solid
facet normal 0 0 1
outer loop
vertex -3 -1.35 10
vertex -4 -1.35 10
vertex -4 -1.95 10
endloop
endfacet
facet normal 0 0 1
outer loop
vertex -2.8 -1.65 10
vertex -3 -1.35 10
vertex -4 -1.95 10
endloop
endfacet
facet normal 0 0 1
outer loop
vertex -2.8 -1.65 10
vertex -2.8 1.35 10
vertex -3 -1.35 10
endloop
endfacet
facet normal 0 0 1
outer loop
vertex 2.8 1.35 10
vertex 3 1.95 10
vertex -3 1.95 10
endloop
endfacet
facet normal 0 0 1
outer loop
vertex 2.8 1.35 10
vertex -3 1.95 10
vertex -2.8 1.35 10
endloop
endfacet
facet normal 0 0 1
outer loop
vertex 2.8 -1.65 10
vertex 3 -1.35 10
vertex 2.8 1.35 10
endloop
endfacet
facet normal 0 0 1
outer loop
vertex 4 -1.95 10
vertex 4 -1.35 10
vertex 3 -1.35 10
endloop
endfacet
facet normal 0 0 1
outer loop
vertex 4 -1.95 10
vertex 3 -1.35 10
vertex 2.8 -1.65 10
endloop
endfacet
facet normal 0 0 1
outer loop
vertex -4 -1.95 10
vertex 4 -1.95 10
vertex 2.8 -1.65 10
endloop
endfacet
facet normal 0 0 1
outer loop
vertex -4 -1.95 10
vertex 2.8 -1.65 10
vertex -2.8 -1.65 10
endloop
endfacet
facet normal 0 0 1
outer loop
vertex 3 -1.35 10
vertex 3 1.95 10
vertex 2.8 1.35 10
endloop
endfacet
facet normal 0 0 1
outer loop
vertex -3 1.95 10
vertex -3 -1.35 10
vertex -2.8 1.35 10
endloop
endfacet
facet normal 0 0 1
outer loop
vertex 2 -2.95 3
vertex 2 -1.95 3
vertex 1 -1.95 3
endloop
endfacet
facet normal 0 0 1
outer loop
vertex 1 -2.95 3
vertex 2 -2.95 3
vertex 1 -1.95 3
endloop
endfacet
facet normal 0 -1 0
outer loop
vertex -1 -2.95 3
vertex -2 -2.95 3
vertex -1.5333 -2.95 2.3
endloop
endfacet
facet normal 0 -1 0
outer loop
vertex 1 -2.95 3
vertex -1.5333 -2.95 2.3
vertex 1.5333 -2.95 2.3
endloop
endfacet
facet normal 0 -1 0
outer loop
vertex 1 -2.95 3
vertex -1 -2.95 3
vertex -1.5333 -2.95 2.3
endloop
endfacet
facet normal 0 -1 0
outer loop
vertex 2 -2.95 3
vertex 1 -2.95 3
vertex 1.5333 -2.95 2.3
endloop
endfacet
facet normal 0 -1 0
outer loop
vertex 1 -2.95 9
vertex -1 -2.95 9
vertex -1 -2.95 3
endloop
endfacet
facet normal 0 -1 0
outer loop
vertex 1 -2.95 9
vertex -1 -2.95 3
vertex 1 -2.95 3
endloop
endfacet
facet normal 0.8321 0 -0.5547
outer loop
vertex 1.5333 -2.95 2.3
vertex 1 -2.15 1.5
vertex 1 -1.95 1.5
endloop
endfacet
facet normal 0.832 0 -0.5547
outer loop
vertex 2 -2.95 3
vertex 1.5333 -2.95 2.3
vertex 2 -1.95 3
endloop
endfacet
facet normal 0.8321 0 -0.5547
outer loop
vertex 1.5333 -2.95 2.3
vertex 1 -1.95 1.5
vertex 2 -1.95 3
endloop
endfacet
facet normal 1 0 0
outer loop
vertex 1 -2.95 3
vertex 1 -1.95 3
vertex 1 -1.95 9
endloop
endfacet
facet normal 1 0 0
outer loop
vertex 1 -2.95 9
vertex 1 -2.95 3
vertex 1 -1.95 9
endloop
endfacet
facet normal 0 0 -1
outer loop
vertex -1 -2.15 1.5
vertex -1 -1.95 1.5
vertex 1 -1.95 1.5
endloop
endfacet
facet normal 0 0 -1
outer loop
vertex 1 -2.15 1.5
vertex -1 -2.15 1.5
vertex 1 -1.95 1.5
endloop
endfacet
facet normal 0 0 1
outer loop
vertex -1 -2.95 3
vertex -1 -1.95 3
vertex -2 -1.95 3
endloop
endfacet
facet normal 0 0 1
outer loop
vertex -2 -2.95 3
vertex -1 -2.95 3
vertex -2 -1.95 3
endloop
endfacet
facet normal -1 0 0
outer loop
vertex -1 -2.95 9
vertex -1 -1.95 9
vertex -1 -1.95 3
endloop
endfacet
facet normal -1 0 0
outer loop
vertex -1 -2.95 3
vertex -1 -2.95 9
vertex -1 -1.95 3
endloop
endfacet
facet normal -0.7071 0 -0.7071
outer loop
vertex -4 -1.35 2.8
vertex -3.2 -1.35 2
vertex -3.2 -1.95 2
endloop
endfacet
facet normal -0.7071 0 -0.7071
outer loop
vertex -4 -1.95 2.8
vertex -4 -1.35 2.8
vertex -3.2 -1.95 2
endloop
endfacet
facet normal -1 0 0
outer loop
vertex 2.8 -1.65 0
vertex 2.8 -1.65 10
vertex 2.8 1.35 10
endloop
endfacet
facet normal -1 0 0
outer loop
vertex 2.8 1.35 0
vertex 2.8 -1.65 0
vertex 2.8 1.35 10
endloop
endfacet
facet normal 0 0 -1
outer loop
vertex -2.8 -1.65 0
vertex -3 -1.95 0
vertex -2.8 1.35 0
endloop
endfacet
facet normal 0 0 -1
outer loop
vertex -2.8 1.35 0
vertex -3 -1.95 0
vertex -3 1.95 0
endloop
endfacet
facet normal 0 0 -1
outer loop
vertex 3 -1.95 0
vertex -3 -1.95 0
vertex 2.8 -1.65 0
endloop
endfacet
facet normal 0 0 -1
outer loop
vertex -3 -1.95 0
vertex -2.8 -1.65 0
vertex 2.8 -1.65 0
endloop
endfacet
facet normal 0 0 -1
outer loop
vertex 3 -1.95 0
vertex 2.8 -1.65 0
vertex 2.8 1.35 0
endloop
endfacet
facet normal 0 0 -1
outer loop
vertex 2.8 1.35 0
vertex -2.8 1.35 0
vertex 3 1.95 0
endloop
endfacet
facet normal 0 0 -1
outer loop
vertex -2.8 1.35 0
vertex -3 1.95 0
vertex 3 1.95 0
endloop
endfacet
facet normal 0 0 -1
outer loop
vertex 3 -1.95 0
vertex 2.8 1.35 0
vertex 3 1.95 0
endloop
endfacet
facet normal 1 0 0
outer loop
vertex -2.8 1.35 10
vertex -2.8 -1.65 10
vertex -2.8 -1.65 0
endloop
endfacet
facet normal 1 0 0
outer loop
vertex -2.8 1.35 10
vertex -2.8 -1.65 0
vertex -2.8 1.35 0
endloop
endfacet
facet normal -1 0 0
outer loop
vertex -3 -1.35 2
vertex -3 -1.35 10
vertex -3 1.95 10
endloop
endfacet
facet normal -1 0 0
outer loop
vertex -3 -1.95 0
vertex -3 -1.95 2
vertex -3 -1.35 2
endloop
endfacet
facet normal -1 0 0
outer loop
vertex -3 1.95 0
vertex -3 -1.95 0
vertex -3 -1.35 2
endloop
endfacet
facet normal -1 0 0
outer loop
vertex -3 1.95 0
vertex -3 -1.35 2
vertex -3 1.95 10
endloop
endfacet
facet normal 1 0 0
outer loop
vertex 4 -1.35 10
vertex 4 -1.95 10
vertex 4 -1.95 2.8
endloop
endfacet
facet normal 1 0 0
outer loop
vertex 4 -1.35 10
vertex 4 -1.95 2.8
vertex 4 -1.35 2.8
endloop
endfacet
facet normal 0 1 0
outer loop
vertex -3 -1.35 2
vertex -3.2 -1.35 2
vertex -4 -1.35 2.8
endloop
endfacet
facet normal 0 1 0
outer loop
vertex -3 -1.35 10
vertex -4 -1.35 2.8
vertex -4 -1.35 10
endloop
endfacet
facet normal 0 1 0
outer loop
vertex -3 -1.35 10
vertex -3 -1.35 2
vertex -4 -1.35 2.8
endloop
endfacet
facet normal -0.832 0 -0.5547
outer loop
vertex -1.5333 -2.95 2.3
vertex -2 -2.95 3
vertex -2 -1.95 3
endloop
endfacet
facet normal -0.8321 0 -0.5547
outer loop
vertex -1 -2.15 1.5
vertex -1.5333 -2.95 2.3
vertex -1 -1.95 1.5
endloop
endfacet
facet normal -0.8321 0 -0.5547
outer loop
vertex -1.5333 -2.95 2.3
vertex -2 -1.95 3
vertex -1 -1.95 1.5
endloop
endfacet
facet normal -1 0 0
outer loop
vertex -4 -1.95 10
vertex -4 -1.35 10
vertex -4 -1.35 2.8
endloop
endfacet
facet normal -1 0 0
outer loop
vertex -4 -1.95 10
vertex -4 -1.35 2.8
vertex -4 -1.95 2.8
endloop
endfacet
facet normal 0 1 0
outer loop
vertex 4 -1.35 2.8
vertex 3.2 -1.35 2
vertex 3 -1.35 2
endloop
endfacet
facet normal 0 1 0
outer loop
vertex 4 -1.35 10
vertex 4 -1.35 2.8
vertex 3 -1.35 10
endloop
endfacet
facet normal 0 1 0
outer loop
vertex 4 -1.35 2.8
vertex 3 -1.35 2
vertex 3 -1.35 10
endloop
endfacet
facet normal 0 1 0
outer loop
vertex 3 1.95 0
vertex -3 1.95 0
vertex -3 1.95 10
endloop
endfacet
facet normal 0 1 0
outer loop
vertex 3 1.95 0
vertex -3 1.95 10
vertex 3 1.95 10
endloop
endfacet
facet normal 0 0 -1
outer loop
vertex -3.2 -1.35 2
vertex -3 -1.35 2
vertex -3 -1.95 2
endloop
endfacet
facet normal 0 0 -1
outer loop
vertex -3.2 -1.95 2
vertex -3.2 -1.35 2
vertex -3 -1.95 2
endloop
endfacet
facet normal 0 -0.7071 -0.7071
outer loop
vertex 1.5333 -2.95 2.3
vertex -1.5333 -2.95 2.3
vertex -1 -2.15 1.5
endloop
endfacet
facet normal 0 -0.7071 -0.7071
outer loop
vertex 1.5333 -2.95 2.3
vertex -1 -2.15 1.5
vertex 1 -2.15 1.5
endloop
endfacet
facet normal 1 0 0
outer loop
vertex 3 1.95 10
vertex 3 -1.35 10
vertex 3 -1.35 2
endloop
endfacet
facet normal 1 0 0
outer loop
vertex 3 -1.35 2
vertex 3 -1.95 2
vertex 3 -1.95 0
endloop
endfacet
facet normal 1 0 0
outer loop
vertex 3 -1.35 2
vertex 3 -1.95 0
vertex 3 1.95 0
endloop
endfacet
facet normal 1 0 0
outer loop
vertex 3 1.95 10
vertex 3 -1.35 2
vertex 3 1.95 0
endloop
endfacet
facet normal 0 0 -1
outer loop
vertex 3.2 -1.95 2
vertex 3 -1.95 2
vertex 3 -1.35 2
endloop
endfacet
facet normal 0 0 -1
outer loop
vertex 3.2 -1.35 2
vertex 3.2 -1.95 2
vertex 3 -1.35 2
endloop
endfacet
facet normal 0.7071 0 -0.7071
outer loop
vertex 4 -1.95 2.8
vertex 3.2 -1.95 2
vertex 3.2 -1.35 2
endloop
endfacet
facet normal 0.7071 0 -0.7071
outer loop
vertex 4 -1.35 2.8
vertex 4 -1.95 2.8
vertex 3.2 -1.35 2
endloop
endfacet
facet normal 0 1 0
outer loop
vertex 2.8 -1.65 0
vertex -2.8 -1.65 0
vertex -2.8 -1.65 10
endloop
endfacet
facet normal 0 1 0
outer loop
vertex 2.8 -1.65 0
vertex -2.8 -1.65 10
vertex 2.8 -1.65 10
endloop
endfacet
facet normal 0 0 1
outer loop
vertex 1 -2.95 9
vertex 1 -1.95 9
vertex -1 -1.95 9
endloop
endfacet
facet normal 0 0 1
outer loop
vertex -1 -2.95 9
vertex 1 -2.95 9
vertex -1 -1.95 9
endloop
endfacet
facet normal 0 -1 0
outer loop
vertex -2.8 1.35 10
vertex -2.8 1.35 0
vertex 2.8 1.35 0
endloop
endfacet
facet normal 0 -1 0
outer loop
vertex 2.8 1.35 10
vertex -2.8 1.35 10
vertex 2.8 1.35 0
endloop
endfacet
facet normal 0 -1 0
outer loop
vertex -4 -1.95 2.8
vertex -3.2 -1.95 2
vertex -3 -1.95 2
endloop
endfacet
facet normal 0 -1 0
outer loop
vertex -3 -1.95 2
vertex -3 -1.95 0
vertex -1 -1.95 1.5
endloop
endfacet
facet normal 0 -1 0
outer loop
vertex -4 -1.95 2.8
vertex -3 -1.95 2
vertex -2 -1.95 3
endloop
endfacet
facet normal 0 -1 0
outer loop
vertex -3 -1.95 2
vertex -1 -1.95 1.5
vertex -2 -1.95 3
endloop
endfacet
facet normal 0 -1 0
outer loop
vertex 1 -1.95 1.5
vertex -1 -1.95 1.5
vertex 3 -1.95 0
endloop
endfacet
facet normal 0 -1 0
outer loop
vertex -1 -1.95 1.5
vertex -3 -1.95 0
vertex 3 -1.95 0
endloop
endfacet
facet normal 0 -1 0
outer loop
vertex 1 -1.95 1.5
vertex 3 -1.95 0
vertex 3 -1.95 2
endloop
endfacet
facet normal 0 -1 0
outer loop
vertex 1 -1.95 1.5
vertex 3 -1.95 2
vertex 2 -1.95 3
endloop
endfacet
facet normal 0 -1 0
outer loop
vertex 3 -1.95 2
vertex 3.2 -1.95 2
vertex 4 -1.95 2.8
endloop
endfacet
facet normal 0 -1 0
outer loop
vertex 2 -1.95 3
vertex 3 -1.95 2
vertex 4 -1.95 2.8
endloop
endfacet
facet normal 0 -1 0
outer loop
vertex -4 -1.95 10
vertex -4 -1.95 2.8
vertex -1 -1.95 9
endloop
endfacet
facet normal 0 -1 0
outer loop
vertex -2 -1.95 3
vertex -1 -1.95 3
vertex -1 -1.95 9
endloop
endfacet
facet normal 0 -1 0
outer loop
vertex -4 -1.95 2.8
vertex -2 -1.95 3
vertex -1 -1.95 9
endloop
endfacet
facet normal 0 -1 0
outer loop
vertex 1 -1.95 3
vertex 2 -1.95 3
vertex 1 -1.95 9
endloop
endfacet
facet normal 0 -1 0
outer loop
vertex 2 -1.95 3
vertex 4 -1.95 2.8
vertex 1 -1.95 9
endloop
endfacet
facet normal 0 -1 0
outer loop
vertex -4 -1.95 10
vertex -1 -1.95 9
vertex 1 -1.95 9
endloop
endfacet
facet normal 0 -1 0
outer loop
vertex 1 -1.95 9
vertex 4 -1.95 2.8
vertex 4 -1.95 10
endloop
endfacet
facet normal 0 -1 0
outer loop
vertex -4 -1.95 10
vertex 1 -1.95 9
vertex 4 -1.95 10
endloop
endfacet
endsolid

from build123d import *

# Parameters (mm, degrees)
F0_W     = 6
F0_H     = 3.9
F0_W_2   = 5.6
F0_H_2   = 3
F1_DEPTH = 10
F3_DEPTH = 1
F4_SIZE  = 0.8
F5_W     = 0.6
F5_H     = 8
F6_DEPTH = 1
F7_SIZE  = 0.8
F8_W     = 0.6
F8_H     = 8
F9_DEPTH = 1
F10_SIZE = 0.8


with BuildPart() as f1:
    # F0 (on Top) → F1 (new body)
    with BuildSketch(Plane.XY):
        Rectangle(F0_W, F0_H)
        with Locations((0, -0.15)):
            Rectangle(F0_W_2, F0_H_2, mode=Mode.SUBTRACT)
    extrude(amount=F1_DEPTH)

    # F2 (on face) → F3 (join)
    with BuildSketch(Plane.XZ.offset(1.95)):
        Polygon((1, 9), (-1, 9), (-1, 3), (-2, 3), (-1, 1.5), (0, 1.5), (1, 1.5), (2, 3), (1, 3), align=None)
    extrude(amount=F3_DEPTH)

    # F4
    f4_edges = [f1.edges().sort_by_distance(p)[0] for p in [
        (0, -2.95, 1.5),
    ]]
    chamfer(f4_edges, length=F4_SIZE)

    # F5 (on face) → F6 (join)
    with BuildSketch(Plane.YZ.offset(3)):
        with Locations((-1.65, 6)):
            Rectangle(F5_W, F5_H)
    extrude(amount=F6_DEPTH)

    # F7
    f7_edges = [f1.edges().sort_by_distance(p)[0] for p in [
        (4, -1.65, 2),
    ]]
    chamfer(f7_edges, length=F7_SIZE)

    # F8 (on face) → F9 (join)
    with BuildSketch(Plane(origin=(-3, 0, 0), x_dir=(0, -1, 0), z_dir=(-1, 0, 0))):
        with Locations((1.65, 6)):
            Rectangle(F8_W, F8_H)
    extrude(amount=F9_DEPTH)

    # F10
    f10_edges = [f1.edges().sort_by_distance(p)[0] for p in [
        (-4, -1.65, 2),
    ]]
    chamfer(f10_edges, length=F10_SIZE)


solid = f1.part
